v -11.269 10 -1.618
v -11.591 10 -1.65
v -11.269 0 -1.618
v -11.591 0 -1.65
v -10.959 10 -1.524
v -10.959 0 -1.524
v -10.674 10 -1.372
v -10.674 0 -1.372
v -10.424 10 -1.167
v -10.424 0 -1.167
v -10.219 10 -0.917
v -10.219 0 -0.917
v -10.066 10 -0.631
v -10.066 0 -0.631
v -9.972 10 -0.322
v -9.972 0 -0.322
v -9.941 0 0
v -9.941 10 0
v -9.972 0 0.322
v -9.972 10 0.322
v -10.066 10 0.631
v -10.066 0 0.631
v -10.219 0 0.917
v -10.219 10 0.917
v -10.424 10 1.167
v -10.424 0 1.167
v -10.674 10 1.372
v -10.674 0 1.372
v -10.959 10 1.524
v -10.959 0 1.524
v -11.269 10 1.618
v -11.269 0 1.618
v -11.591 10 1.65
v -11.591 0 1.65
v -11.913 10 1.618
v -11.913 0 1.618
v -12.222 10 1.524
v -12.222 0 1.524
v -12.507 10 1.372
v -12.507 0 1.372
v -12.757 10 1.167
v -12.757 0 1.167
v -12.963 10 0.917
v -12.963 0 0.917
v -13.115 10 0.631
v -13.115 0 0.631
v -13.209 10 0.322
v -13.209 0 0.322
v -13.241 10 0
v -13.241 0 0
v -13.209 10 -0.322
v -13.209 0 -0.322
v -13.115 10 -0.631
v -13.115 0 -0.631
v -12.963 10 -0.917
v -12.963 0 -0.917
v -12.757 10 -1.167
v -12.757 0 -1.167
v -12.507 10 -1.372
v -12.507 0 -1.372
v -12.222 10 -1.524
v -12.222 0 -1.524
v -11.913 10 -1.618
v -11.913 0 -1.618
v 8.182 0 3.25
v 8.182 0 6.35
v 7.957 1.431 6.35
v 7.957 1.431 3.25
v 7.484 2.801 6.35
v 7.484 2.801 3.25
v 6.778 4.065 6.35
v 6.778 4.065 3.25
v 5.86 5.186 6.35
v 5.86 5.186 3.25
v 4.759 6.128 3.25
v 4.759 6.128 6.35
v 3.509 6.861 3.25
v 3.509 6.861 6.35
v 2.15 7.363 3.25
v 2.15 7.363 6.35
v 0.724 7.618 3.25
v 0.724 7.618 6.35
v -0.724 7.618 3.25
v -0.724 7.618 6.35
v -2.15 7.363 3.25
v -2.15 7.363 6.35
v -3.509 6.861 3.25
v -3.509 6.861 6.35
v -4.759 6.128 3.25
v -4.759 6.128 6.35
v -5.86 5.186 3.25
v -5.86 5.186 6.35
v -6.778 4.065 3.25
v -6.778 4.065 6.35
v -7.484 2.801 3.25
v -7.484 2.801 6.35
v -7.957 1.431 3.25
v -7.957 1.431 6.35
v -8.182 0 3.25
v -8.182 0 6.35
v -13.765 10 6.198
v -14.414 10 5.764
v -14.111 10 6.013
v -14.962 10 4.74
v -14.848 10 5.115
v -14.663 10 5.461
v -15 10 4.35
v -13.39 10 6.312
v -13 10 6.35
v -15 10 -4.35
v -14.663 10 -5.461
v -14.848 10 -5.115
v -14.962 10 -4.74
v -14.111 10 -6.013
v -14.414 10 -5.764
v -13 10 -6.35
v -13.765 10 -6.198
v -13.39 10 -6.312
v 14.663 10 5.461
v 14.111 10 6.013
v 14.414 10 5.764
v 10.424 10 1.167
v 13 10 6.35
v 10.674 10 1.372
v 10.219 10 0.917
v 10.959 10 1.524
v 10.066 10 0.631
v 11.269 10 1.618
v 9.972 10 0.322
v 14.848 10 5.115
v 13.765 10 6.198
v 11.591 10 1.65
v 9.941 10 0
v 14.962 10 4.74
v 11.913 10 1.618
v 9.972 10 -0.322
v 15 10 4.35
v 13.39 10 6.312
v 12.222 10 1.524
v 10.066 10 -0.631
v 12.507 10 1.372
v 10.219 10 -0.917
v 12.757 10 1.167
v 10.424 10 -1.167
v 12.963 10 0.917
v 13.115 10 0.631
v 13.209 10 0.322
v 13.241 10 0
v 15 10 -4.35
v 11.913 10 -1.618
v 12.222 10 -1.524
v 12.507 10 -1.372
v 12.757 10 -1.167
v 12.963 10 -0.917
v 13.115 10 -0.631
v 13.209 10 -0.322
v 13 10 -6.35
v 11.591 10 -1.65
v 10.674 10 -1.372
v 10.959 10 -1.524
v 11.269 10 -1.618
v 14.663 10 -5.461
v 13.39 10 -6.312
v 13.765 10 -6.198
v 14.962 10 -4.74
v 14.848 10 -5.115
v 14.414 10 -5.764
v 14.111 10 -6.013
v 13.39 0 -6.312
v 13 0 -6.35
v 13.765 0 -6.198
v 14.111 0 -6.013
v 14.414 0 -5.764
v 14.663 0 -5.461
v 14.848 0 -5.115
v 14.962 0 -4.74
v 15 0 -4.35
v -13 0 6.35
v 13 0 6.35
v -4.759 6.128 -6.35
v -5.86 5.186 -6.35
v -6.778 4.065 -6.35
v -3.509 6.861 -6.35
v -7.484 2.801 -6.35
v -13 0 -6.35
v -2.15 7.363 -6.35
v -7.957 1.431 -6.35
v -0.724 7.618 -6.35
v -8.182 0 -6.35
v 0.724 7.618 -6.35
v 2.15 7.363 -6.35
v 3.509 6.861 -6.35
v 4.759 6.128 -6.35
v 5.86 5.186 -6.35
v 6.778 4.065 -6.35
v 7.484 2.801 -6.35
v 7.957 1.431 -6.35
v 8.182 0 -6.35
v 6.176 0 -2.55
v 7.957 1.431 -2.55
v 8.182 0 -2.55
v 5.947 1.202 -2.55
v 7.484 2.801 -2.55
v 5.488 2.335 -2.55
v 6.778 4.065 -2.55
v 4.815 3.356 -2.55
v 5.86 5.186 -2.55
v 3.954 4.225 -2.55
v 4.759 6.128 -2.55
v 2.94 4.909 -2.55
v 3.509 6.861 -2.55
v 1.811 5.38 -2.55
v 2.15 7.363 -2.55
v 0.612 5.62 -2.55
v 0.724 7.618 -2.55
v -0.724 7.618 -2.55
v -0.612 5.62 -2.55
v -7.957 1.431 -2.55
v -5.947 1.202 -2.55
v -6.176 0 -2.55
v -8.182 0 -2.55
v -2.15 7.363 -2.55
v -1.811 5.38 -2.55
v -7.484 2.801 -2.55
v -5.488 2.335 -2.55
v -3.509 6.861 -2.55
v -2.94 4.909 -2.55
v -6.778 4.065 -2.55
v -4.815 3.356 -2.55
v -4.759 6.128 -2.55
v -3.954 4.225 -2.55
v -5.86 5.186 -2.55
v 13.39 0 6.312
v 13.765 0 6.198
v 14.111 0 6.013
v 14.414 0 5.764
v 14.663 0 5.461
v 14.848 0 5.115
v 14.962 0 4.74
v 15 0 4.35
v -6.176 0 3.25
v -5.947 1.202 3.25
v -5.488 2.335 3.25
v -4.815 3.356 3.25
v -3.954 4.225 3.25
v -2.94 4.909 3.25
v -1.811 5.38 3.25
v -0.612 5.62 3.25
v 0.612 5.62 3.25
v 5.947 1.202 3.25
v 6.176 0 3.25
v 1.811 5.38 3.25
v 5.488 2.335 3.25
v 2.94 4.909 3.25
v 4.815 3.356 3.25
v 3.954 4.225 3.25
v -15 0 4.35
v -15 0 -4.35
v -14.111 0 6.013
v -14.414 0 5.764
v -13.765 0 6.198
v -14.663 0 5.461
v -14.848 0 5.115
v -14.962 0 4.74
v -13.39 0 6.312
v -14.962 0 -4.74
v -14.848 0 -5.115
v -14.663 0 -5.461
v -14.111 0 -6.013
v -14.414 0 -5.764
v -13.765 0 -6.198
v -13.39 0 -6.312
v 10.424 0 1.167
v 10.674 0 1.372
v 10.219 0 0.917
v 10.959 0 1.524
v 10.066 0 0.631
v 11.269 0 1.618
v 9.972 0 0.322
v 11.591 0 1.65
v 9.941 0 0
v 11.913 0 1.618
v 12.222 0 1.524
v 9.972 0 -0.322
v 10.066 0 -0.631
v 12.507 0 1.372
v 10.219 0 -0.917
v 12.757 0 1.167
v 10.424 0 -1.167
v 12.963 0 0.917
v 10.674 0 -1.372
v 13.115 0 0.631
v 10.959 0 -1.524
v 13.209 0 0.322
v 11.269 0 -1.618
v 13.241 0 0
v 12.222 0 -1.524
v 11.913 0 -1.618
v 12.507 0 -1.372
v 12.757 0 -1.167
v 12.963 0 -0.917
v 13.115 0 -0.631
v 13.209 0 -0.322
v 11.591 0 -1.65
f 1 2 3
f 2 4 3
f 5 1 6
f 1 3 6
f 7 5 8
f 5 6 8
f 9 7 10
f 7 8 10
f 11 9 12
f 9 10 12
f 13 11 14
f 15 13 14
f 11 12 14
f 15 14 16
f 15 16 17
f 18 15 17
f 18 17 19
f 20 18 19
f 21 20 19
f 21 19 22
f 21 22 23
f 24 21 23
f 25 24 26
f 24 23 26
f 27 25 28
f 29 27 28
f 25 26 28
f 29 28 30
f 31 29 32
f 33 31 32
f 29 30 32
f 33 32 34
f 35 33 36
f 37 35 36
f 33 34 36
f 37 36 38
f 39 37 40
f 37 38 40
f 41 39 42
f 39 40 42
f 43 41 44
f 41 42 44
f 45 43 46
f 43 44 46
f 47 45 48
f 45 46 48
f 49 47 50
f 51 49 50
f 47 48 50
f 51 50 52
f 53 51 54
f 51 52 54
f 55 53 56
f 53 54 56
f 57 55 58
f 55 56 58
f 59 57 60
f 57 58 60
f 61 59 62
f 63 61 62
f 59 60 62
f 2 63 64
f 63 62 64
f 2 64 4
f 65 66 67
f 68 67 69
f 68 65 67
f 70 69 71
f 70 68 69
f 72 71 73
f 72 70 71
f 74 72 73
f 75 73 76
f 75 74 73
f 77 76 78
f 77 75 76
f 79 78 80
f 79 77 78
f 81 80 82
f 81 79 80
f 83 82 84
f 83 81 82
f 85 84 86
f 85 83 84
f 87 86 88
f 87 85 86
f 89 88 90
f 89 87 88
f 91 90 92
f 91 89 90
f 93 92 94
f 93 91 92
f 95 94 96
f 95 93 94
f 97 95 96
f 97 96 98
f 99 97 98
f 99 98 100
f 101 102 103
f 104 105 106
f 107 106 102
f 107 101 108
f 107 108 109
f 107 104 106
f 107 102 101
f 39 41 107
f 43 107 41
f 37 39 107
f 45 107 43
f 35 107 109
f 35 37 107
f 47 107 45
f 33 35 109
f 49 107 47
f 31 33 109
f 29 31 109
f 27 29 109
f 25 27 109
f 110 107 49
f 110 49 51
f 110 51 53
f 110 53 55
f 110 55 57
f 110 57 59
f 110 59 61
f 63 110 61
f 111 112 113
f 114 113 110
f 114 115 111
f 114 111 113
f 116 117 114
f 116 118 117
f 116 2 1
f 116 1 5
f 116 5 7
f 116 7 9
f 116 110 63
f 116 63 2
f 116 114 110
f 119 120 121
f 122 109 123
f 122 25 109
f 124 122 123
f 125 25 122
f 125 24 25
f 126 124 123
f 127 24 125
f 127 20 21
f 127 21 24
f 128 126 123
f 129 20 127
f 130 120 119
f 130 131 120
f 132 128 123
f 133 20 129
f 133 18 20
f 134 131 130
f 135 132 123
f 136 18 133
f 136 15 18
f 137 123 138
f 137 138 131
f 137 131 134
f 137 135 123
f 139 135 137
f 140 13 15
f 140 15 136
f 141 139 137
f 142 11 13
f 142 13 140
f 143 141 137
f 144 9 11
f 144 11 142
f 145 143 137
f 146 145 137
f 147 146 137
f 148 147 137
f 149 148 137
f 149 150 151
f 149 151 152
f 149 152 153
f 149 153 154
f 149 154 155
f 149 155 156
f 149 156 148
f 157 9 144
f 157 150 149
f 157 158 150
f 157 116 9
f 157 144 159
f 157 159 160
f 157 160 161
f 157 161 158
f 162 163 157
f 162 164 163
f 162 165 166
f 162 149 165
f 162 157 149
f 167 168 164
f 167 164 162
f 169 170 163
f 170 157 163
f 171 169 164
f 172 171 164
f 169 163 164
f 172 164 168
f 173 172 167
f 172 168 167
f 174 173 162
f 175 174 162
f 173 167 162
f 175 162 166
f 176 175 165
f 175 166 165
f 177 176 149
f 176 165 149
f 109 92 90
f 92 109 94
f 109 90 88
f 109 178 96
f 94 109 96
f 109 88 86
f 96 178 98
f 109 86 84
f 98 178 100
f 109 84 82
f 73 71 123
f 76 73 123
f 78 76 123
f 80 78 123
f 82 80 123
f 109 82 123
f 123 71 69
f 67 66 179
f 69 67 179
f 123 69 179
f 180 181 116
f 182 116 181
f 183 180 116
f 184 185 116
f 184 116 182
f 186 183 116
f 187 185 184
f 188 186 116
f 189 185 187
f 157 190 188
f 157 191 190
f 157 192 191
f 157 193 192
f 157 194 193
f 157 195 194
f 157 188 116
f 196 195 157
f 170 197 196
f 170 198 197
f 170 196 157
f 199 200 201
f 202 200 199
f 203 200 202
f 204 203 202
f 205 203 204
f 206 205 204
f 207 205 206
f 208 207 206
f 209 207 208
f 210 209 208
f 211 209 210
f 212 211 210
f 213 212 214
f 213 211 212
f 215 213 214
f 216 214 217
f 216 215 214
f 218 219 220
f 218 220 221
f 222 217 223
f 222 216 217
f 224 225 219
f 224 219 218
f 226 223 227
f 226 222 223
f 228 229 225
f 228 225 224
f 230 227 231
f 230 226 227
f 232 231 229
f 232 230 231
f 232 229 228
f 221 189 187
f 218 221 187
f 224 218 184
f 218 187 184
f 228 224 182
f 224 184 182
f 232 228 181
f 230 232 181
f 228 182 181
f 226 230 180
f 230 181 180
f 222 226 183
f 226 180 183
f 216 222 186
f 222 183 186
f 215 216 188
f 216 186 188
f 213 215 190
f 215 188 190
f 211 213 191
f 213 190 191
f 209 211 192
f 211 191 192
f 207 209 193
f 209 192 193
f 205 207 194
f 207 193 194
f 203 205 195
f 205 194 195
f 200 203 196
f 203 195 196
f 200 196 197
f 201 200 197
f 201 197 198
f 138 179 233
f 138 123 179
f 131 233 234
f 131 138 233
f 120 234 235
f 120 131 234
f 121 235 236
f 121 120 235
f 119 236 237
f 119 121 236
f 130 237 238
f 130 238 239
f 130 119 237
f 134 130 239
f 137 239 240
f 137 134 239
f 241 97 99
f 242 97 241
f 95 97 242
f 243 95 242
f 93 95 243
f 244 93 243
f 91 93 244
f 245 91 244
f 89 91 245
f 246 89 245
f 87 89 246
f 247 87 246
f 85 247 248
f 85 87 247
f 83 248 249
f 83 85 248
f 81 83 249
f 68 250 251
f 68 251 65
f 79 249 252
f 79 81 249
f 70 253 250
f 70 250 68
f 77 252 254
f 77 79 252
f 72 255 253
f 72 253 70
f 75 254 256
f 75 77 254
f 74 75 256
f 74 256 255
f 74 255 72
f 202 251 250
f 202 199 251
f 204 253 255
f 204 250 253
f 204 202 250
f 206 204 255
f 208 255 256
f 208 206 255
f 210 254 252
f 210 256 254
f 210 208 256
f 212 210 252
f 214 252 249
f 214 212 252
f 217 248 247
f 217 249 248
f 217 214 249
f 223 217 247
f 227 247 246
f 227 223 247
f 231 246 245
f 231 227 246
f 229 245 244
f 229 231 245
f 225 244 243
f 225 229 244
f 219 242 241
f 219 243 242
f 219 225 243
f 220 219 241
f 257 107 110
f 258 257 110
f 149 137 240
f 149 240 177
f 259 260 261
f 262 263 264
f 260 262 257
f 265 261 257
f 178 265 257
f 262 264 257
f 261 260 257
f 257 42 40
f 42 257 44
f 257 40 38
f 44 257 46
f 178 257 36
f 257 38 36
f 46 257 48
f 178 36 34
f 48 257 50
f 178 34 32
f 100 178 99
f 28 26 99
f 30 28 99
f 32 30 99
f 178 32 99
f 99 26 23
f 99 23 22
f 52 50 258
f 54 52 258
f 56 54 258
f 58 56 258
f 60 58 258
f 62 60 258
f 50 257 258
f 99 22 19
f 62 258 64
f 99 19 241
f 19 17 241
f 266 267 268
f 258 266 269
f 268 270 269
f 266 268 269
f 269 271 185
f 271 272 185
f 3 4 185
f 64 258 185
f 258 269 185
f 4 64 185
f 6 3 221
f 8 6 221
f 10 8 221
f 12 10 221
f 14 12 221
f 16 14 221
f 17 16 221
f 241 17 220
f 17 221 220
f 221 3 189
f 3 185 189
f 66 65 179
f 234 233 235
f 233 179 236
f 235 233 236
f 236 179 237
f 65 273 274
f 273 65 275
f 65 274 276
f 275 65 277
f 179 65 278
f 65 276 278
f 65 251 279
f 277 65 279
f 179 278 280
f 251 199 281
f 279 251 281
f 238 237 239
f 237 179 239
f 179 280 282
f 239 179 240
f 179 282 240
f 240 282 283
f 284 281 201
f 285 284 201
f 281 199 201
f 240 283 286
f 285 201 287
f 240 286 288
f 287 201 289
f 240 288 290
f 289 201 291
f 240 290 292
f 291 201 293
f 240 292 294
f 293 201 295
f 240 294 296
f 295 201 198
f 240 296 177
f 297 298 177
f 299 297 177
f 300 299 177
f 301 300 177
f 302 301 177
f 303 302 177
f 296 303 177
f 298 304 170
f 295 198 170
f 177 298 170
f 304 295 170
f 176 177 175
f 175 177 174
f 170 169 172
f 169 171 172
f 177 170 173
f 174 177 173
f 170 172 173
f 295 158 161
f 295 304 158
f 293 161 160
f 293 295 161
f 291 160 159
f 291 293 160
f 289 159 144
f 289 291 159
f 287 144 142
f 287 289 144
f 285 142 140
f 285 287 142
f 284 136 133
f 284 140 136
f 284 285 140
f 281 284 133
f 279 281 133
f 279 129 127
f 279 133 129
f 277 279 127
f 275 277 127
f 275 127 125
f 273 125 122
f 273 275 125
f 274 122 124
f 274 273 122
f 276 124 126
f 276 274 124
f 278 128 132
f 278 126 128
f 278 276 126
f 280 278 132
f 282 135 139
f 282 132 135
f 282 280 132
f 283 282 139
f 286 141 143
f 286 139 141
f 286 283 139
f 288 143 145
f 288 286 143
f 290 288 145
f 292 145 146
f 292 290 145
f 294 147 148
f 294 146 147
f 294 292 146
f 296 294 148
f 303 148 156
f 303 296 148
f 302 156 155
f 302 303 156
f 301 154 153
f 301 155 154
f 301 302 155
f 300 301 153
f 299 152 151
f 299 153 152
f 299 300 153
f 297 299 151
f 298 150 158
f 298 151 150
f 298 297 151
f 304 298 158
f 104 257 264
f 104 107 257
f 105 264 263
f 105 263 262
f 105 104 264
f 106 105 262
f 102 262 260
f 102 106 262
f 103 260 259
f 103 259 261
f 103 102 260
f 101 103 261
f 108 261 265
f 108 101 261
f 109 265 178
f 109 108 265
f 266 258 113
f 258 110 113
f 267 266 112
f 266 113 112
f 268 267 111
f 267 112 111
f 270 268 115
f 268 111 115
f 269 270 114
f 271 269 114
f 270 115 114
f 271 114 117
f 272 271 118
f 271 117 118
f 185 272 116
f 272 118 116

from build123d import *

# Parameters (mm, degrees)
SKETCH1_W               = 30
SKETCH1_H               = 12.7
BOSS_EXTRUDE1_DEPTH     = 10
SKETCH2_R               = 8.2
CUT_EXTRUDE1_DEPTH      = 3.8
CUT_EXTRUDE2_START      = -3.1
SKETCH3_R               = 8.2
CUT_EXTRUDE2_DEPTH      = 3.1
CUT_EXTRUDE3_DEPTH      = 21.424495098
CUT_EXTRUDE3_DEPTH_BACK = 21.424495098
SKETCH4_R               = 6.2
FILLET1_R               = 2
SKETCH5_R               = 1.65
CUT_EXTRUDE4_DEPTH      = 20.113411522


with BuildPart() as part:
    # Sketch1 → Boss-Extrude1 (new body)
    with BuildSketch(Plane(origin=(0, 0, 0), x_dir=(1, 0, 0), z_dir=(0, 1, 0))):
        Rectangle(SKETCH1_W, SKETCH1_H)
    extrude(amount=BOSS_EXTRUDE1_DEPTH)

    # Sketch2 → Cut-Extrude1 (cut)
    with BuildSketch(Plane(origin=(0, 0, -6.35), x_dir=(-1, 0, 0), z_dir=(0, 0, -1))):
        with Locations((0, -0.55)):
            Circle(SKETCH2_R)
    extrude(amount=-CUT_EXTRUDE1_DEPTH, mode=Mode.SUBTRACT)

    # Sketch3 → Cut-Extrude2 (cut)
    with BuildSketch(Plane.XY.offset(6.35).offset(CUT_EXTRUDE2_START)):
        with Locations((0, -0.55)):
            Circle(SKETCH3_R)
    extrude(amount=CUT_EXTRUDE2_DEPTH, mode=Mode.SUBTRACT)

    # Sketch4 → Cut-Extrude3 (cut, two sides: drawn at the far end of the back side and taken through both)
    with BuildSketch(Plane.XY.offset(3.25).offset(-CUT_EXTRUDE3_DEPTH_BACK)):
        with Locations((0, -0.55)):
            Circle(SKETCH4_R)
    extrude(amount=CUT_EXTRUDE3_DEPTH + CUT_EXTRUDE3_DEPTH_BACK, mode=Mode.SUBTRACT)

    # Fillet1
    fillet1_edges = [part.edges().sort_by_distance(p)[0] for p in [
        (15, 5, 6.35),
        (-15, 5, 6.35),
        (-15, 5, -6.35),
        (15, 5, -6.35),
    ]]
    fillet(fillet1_edges, radius=FILLET1_R)

    # Sketch5 → Cut-Extrude4 (cut, symmetric)
    with BuildSketch(Plane.XZ):
        with Locations(Location((-11.590767043, 0, 0), (0, 0, 270))):
            Circle(SKETCH5_R)
    cut_extrude4 = extrude(amount=CUT_EXTRUDE4_DEPTH, both=True, mode=Mode.SUBTRACT)

    # Mirror1: Cut-Extrude4 across plane
    add(cut_extrude4.mirror(Plane(origin=(0, 0, 0), x_dir=(0, 0, 1), z_dir=(1, 0, 0))), mode=Mode.SUBTRACT)


solid = part.part
